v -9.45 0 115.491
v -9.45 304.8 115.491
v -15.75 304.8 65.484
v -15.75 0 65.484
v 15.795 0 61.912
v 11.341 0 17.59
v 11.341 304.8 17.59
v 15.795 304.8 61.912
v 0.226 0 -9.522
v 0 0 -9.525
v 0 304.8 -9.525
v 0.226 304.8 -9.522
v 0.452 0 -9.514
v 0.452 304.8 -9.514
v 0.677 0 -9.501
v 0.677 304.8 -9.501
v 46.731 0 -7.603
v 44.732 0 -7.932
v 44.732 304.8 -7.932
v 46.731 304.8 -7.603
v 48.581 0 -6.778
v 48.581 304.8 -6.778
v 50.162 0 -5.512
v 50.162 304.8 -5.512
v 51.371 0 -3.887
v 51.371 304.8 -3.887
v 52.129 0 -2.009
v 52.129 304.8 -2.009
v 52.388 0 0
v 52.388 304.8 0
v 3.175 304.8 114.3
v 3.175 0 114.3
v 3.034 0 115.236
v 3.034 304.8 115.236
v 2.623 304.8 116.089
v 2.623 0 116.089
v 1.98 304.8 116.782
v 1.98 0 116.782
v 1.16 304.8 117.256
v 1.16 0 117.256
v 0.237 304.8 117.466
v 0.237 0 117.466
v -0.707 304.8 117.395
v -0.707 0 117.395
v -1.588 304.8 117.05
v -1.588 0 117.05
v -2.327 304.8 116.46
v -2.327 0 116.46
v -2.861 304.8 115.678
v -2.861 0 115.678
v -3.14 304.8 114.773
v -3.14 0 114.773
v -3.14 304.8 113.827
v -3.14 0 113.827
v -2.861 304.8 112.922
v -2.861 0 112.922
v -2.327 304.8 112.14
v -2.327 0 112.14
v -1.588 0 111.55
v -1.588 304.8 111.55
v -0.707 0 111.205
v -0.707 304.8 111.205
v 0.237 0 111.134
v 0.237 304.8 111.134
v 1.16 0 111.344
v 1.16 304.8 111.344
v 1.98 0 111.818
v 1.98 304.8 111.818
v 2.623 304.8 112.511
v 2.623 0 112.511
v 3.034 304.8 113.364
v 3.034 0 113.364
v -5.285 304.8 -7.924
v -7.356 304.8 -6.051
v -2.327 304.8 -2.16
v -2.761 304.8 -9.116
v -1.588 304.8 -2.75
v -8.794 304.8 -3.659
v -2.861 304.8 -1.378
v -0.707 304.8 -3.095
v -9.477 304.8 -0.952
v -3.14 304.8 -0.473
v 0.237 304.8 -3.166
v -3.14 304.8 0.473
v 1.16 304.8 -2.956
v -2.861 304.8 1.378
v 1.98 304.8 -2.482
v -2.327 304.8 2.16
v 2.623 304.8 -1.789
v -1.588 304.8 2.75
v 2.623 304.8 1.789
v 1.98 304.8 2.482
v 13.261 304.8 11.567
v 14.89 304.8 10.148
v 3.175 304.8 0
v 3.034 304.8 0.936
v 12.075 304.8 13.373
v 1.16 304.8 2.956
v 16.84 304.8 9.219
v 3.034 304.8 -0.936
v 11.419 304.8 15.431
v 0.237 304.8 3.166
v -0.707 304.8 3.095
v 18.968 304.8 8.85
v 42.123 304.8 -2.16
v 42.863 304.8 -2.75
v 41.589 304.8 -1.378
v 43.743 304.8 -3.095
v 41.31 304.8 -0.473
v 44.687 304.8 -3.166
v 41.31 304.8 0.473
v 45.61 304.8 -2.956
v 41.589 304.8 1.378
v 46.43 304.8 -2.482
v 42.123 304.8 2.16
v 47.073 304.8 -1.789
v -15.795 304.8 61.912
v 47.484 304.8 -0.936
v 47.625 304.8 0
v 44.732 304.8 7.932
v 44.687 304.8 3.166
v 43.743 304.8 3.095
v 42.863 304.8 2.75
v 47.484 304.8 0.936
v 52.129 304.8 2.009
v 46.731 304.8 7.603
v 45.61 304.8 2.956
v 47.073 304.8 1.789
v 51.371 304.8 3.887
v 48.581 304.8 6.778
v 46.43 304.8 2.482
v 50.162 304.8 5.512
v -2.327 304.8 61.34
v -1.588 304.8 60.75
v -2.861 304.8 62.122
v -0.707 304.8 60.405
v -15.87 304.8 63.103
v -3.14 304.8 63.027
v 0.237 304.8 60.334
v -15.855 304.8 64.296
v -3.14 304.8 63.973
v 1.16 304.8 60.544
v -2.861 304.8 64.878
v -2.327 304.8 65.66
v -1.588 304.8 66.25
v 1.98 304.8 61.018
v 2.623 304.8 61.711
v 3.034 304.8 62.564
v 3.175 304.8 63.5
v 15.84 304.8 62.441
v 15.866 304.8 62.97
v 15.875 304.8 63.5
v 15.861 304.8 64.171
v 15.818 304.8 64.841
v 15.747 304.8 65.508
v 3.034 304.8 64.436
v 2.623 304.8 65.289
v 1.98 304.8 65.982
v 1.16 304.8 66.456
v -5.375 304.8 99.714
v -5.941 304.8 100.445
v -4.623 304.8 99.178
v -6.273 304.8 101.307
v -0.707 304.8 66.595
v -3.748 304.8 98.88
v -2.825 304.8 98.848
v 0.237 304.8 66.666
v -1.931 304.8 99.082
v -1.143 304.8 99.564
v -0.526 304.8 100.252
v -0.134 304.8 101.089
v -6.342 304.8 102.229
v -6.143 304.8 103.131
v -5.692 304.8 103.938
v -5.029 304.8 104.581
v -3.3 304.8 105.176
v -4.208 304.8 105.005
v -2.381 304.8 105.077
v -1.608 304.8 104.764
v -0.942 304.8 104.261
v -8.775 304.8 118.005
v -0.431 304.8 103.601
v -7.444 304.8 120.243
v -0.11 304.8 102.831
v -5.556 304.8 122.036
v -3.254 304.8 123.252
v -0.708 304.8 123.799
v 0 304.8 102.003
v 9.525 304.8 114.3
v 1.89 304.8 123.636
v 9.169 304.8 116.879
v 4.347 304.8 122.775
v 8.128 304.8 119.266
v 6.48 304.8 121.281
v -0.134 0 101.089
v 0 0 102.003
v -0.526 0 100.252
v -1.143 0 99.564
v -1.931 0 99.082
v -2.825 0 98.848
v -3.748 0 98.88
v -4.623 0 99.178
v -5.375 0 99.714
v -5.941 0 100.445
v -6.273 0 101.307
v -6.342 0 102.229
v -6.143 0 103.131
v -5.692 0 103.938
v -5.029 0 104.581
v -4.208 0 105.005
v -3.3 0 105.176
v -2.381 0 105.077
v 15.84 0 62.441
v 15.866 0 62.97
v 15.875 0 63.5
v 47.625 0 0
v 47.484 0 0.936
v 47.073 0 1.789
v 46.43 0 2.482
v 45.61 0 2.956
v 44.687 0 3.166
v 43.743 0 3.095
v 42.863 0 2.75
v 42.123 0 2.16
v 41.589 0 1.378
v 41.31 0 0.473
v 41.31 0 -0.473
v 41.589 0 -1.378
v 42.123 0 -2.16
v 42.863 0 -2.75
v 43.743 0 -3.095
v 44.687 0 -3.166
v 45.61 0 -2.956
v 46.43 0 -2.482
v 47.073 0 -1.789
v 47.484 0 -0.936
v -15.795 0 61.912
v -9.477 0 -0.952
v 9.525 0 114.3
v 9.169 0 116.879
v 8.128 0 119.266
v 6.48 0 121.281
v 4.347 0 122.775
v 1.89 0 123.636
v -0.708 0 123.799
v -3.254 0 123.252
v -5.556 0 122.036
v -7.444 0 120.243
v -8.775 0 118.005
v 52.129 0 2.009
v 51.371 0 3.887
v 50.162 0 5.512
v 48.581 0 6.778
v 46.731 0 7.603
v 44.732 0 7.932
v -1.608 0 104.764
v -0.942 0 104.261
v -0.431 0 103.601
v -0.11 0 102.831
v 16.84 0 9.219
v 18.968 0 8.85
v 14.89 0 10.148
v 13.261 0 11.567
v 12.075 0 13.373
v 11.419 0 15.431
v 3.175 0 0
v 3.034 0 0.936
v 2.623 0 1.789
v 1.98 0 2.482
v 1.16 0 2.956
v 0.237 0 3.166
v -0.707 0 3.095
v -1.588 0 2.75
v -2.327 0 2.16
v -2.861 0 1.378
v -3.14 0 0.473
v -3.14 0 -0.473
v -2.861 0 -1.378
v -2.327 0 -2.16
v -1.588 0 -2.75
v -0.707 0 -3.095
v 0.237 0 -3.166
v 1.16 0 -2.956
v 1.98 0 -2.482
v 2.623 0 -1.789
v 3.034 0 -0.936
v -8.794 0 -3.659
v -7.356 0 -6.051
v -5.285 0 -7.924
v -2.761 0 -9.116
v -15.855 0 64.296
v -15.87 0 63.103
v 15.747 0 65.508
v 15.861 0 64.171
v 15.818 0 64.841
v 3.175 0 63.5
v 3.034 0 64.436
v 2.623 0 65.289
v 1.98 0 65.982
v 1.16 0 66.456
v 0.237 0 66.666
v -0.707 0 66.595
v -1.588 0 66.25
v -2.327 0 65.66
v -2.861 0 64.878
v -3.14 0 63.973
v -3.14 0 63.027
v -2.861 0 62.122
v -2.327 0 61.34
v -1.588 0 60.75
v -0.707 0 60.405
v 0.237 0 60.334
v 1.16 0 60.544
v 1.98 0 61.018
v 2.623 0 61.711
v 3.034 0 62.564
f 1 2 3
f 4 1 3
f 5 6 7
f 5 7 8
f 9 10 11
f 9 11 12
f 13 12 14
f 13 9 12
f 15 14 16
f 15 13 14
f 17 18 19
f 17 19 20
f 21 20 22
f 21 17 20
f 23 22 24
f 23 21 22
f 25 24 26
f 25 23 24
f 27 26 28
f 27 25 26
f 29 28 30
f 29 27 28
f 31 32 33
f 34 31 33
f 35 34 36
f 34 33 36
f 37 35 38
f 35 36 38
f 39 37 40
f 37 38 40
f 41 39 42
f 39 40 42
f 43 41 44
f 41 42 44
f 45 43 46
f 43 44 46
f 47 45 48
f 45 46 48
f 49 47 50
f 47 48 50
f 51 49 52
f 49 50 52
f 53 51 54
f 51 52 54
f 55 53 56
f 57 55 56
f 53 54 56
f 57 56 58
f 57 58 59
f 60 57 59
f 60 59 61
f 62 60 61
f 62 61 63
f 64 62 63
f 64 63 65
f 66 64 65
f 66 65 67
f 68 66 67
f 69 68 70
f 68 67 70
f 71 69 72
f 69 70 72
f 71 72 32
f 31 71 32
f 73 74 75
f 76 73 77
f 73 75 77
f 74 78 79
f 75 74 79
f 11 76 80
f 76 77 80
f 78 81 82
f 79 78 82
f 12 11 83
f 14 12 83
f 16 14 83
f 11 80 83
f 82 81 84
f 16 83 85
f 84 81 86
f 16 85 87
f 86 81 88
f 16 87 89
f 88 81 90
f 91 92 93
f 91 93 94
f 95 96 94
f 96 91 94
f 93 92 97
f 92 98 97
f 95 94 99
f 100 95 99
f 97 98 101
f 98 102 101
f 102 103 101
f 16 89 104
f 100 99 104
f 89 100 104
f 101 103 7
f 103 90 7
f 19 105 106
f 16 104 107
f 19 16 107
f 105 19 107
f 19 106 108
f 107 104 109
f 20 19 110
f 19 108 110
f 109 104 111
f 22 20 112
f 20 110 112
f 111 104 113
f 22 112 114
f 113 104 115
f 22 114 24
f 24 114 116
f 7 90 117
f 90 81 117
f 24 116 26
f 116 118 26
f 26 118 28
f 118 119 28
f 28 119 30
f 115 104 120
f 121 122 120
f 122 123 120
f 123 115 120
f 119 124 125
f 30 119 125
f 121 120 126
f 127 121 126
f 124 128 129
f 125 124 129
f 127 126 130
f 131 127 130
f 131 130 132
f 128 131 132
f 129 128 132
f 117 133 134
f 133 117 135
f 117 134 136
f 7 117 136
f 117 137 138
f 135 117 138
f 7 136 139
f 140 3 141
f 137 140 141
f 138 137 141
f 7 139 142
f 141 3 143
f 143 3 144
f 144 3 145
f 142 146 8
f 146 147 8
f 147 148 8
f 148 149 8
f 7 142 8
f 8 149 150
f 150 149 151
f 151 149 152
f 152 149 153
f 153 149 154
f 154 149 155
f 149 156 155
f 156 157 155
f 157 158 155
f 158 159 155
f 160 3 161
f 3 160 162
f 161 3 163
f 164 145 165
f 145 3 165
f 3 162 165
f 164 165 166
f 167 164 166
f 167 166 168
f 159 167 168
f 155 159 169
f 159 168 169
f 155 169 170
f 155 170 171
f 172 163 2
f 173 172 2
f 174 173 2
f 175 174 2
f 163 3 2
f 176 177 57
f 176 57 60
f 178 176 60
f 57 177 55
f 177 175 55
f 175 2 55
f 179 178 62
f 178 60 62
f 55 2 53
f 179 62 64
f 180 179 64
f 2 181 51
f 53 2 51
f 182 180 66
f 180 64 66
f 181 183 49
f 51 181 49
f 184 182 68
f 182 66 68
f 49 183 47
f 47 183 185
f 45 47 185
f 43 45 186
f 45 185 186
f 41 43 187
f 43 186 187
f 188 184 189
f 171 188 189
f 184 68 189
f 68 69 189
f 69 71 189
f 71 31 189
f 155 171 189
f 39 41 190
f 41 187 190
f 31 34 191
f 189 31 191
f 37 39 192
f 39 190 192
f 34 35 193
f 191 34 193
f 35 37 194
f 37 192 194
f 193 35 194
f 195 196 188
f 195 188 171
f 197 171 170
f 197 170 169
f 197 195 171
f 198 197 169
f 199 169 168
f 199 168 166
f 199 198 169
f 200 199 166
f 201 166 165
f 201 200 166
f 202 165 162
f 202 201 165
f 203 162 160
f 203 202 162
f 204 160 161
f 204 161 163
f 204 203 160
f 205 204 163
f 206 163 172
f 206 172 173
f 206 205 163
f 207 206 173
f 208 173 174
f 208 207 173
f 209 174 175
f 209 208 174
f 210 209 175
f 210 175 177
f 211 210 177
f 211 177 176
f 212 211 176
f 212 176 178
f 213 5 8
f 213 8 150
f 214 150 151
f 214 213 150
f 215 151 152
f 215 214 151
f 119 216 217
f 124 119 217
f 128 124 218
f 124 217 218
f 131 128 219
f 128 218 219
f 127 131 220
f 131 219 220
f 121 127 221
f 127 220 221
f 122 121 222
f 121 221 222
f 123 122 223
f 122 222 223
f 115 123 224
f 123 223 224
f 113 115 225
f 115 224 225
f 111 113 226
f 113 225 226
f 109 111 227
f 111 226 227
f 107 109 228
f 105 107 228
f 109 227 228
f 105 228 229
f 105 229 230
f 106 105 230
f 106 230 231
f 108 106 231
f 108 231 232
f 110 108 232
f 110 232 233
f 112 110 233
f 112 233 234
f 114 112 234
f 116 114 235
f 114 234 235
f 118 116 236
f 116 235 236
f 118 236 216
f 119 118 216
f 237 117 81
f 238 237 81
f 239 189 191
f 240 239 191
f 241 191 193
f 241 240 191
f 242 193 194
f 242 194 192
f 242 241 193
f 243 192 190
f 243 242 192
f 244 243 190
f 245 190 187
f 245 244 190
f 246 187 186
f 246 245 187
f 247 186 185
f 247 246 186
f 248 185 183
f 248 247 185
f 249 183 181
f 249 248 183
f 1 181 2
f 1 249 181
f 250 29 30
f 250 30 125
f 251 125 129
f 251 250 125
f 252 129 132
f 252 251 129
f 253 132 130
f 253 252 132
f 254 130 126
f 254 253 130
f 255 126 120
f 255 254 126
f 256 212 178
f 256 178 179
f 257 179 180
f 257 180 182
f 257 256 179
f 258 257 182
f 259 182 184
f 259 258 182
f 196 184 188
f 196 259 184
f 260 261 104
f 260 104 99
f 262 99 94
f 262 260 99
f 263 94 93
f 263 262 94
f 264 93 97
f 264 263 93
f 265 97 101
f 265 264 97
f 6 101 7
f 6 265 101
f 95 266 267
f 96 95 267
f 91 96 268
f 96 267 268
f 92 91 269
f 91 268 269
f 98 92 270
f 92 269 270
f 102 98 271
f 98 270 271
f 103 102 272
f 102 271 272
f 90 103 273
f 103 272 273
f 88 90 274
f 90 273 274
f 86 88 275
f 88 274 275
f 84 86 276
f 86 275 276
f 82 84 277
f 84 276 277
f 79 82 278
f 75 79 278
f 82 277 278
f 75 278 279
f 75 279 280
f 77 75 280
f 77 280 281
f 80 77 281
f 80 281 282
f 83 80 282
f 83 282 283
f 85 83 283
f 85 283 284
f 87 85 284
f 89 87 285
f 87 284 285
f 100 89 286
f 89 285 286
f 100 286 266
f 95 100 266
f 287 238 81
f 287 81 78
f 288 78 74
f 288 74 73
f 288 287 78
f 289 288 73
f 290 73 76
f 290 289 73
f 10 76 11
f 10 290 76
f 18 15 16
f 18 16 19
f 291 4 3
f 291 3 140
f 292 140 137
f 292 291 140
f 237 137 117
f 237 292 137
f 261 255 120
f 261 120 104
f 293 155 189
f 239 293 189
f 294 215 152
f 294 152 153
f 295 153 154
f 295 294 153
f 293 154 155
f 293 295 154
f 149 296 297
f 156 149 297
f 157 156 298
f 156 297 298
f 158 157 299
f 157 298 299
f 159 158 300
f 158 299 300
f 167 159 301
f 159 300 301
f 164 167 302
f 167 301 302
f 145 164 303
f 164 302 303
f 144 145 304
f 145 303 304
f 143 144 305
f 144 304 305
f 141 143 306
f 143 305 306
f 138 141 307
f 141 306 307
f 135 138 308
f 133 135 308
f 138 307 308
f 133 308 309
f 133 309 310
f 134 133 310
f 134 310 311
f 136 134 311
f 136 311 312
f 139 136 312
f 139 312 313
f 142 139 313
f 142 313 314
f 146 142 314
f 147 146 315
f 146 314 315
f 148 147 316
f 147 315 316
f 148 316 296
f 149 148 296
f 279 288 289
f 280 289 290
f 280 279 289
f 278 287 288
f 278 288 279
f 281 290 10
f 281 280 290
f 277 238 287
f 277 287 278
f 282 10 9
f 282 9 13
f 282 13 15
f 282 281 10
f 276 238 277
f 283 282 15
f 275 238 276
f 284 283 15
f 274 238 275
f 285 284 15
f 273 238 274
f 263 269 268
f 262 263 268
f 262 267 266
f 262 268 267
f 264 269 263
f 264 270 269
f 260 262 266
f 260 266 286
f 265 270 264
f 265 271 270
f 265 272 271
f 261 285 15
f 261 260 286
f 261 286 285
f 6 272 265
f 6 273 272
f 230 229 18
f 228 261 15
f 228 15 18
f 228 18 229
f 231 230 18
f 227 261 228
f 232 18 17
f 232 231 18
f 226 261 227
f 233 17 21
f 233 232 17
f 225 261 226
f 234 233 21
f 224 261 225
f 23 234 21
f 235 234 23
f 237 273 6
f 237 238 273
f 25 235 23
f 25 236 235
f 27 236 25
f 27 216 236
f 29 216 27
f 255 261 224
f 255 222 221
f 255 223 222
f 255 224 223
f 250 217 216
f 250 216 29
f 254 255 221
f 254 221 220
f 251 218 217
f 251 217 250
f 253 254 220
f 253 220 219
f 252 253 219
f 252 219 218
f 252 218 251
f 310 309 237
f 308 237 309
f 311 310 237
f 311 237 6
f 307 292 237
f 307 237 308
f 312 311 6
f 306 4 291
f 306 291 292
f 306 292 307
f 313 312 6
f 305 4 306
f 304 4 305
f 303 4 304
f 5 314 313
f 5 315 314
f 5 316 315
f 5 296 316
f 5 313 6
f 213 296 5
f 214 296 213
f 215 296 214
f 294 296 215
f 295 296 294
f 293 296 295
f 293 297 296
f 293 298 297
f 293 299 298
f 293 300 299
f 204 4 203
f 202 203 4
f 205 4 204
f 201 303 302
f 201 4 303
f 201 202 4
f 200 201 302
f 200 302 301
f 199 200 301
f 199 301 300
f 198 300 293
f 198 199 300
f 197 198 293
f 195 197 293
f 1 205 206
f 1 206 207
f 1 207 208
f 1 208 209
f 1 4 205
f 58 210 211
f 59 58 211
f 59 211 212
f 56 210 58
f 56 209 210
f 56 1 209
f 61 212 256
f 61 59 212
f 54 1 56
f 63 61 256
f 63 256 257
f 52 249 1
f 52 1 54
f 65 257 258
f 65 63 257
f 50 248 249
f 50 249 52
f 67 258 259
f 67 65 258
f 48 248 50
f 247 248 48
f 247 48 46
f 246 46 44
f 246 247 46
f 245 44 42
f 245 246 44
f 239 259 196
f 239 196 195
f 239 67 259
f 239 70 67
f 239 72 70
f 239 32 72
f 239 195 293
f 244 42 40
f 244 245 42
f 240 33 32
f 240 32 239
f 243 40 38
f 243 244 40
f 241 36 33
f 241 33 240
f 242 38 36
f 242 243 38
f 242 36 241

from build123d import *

# Parameters (mm, degrees)
F0_R     = 3.175
F1_DEPTH = 304.8


with BuildPart() as f1:
    # F0 (on Front) → F1 (new body)
    with BuildSketch(Plane.XZ):
        with BuildLine():
            ThreePointArc((-2.3812504012, 105.0774585104), (5.8328472862, 106.7698261948), (9.525, 114.3))
            ThreePointArc((9.525, 114.3), (0.596483242, 123.8063048942), (-9.4502929642, 115.490625))
            ThreePointArc((-9.4502929642, 115.490625), (-7.8806639116, 108.9501624966), (-2.3812504012, 105.0774585104))
        make_face()
        with Locations((0, 114.3)):
            Circle(F0_R, mode=Mode.SUBTRACT)
        with BuildLine():
            Line((15.7474569047, 65.5082893304), (9.525, 114.3))
            ThreePointArc((9.525, 114.3), (5.8328472862, 106.7698261948), (-2.3812504012, 105.0774585104))
            ThreePointArc((-2.3812504012, 105.0774585104), (-7.8806639116, 108.9501624966), (-9.4502929642, 115.490625))
            Line((-9.4502929642, 115.490625), (-15.7504882737, 65.484375))
            ThreePointArc((-15.7504882737, 65.484375), (-0.0120528461, 79.3749954245), (15.7474569047, 65.5082893304))
        make_face()
        with BuildLine():
            ThreePointArc((0, 102.0032778758), (-5.6850577659, 100.0589952287), (-2.3812504012, 105.0774585104))
            ThreePointArc((-2.3812504012, 105.0774585104), (-0.6649422341, 103.9475605229), (0, 102.0032778758))
        make_face(mode=Mode.SUBTRACT)
        with BuildLine():
            ThreePointArc((15.875, 63.5), (15.8430821396, 64.5061676396), (15.7474569047, 65.5082893304))
            ThreePointArc((15.7474569047, 65.5082893304), (-0.0120528461, 79.3749954245), (-15.7504882737, 65.484375))
            ThreePointArc((-15.7504882737, 65.484375), (-15.8737438155, 63.6997054867), (-15.7954255641, 61.9125))
            ThreePointArc((-15.7954255641, 61.9125), (0, 47.625), (15.7954255641, 61.9125))
            ThreePointArc((15.7954255641, 61.9125), (15.8550939106, 62.7052534459), (15.875, 63.5))
        make_face()
        with Locations((0, 63.5)):
            Circle(F0_R, mode=Mode.SUBTRACT)
        with BuildLine():
            ThreePointArc((15.7954255641, 61.9125), (0, 47.625), (-15.7954255641, 61.9125))
            Line((-15.7954255641, 61.9125), (-9.4772553384, -0.9525))
            ThreePointArc((-9.4772553384, -0.9525), (-0.4768479324, 9.5130563464), (9.525, 0))
            ThreePointArc((9.525, 0), (6.9705567315, -6.4912990883), (0.6773435479, -9.500885786))
            Line((0.6773435479, -9.500885786), (44.7324052746, -7.9324746146))
            ThreePointArc((44.7324052746, -7.9324746146), (36.5125, 0), (44.7324052746, 7.9324746146))
            Line((44.7324052746, 7.9324746146), (18.968327868, 8.8497055806))
            ThreePointArc((18.968327868, 8.8497055806), (13.2612039825, 11.5674628959), (11.3408358685, 17.5898921545))
            Line((11.3408358685, 17.5898921545), (15.7954255641, 61.9125))
        make_face()
        with BuildLine():
            ThreePointArc((9.525, 0), (-0.4768479324, 9.5130563464), (-9.4772553384, -0.9525))
            ThreePointArc((-9.4772553384, -0.9525), (-6.3895642457, -7.063929059), (0, -9.525))
            Line((0, -9.525), (0.6773435479, -9.500885786))
            ThreePointArc((0.6773435479, -9.500885786), (6.9705567315, -6.4912990883), (9.525, 0))
        make_face()
        Circle(F0_R, mode=Mode.SUBTRACT)
        with BuildLine():
            Line((0.6773435479, -9.500885786), (0, -9.525))
            ThreePointArc((0, -9.525), (0.3388863295, -9.5189695375), (0.6773435479, -9.500885786))
        make_face()
        with BuildLine():
            ThreePointArc((52.3875, 0), (50.1616327839, 5.5119104847), (44.7324052746, 7.9324746146))
            ThreePointArc((44.7324052746, 7.9324746146), (36.5125, 0), (44.7324052746, -7.9324746146))
            ThreePointArc((44.7324052746, -7.9324746146), (50.1616327839, -5.5119104847), (52.3875, 0))
        make_face()
        with Locations((44.45, 0)):
            Circle(F0_R, mode=Mode.SUBTRACT)
    extrude(amount=-F1_DEPTH)


solid = f1.part
